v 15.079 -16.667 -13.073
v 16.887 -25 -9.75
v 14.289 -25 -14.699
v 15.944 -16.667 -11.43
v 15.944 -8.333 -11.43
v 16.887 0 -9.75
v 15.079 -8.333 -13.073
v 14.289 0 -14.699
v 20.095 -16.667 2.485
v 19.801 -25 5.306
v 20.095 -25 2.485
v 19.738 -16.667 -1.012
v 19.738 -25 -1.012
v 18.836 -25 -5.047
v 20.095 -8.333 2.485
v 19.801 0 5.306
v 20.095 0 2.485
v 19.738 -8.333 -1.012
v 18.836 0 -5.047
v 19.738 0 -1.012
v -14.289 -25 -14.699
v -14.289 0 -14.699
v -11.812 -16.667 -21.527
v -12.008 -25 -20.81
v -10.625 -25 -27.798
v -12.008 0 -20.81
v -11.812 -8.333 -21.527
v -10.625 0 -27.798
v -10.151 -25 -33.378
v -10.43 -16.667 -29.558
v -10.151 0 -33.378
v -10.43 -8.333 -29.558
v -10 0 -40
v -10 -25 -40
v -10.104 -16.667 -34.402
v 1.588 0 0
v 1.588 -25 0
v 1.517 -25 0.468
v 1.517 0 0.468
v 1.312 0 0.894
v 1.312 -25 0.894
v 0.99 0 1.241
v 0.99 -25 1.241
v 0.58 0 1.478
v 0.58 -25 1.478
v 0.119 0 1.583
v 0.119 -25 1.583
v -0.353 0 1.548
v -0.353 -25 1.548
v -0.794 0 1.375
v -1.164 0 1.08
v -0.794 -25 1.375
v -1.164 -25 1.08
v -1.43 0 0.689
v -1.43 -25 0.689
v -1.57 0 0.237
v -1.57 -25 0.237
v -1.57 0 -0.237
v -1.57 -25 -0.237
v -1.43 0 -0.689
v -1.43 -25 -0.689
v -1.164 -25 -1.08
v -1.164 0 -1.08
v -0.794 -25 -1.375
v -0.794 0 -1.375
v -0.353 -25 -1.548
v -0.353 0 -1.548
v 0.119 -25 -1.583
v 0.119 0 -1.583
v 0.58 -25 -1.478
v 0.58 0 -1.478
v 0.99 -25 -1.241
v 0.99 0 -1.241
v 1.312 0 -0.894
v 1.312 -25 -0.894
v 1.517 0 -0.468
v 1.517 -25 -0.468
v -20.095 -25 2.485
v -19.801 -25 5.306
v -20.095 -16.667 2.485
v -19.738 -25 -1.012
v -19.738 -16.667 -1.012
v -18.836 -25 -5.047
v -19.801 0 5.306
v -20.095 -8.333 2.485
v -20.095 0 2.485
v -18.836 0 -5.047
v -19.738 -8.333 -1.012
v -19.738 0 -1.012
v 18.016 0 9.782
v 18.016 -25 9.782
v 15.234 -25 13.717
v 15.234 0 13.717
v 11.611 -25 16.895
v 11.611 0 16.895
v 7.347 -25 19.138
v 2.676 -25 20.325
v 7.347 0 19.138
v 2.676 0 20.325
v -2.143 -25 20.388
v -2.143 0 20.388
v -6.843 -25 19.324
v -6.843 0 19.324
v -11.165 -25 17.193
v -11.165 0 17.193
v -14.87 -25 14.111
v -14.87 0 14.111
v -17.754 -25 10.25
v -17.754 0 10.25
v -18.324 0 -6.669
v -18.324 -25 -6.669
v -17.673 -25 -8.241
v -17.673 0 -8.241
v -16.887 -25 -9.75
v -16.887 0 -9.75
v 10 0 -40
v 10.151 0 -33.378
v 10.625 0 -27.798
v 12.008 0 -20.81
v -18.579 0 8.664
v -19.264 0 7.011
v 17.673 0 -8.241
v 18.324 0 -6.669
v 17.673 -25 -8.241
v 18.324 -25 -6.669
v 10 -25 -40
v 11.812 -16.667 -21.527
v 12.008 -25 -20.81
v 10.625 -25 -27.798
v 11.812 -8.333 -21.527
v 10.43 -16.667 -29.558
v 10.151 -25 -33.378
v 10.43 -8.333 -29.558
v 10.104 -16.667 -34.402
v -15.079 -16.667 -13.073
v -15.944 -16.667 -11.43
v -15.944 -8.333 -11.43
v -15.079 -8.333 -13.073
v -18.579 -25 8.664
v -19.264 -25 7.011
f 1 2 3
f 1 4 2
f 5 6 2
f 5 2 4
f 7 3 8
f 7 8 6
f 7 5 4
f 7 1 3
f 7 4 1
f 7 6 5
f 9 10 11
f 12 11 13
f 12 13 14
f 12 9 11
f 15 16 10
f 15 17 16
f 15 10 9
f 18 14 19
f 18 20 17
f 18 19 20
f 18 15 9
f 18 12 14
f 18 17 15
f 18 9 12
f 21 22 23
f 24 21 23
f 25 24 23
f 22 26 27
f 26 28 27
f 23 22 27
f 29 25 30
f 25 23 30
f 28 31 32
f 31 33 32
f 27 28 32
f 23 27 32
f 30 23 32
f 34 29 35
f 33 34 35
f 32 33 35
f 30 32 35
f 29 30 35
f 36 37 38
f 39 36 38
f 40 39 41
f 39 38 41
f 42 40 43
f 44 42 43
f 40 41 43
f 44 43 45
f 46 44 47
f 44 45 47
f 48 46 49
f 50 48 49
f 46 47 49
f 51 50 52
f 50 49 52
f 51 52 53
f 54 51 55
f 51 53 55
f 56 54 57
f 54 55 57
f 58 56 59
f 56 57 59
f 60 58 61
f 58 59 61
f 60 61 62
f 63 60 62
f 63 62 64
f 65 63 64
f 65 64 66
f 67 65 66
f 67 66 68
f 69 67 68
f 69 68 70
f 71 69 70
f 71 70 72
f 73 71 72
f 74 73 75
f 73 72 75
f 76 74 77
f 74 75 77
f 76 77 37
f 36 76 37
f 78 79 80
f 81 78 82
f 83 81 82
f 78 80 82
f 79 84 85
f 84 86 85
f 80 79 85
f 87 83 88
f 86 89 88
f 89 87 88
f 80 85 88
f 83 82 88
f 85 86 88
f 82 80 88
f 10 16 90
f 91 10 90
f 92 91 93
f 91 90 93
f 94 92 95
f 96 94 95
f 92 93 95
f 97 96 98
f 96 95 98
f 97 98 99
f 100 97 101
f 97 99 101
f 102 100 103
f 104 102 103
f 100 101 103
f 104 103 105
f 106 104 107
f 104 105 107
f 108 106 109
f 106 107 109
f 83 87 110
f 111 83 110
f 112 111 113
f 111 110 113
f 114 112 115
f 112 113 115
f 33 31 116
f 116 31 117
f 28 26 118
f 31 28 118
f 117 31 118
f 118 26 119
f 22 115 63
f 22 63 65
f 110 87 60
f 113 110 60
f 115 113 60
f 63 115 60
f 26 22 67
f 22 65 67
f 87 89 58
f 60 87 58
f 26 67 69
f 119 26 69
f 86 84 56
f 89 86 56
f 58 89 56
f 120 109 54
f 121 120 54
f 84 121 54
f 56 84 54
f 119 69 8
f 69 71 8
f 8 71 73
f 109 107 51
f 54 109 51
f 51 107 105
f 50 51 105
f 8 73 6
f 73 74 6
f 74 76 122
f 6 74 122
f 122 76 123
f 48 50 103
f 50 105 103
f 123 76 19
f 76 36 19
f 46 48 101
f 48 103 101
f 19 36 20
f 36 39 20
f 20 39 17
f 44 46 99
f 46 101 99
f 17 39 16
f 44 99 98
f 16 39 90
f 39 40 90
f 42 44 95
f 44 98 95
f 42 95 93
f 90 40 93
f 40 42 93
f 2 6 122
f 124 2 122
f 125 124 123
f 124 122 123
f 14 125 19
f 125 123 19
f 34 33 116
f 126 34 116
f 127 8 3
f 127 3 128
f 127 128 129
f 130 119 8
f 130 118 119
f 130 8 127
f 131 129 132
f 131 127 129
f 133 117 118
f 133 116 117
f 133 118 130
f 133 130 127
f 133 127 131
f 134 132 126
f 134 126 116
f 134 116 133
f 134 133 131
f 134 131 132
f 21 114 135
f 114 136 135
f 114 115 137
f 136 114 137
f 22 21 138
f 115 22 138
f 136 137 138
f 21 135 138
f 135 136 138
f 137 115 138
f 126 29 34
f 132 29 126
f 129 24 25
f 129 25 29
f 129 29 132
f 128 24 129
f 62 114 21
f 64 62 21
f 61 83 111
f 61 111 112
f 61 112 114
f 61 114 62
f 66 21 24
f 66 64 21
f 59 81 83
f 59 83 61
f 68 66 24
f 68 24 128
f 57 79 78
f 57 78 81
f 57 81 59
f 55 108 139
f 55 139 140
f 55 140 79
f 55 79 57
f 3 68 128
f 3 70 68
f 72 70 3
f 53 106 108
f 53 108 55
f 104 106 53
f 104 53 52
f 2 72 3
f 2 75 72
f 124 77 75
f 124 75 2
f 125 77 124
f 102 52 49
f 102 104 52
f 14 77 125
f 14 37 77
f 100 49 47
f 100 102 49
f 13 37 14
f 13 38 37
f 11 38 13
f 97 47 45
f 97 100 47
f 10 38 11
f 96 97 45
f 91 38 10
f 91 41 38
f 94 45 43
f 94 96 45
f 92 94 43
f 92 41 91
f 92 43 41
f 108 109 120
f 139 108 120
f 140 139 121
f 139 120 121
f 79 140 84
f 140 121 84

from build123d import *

# Parameters (mm, degrees)
F1_DEPTH = 25
F2_R     = 1.5875
F3_DEPTH = 25


with BuildPart() as f1:
    # F0 (on Front) → F1 (new body)
    with BuildSketch(Plane.XZ):
        with BuildLine():
            ThreePointArc((-17.7535207776, 10.25), (-18.9395304165, 7.8450103635), (-19.8014794389, 5.3057904246))
            add(Edge.make_bspline(
                [(-19.8014794389, 5.3057904246), (-20.454122155, 2.8700946489), (-19.9763700286, -0.7893865531), (-18.8355536126, -5.0469713795)],
                knots=[0, 0, 0, 0, 10.3977252163, 10.3977252163, 10.3977252163, 10.3977252163], degree=3))
            ThreePointArc((-18.8355536126, -5.0469713795), (-19.3331747968, 2.5452607483), (-16.8874953738, 9.75))
            Line((-16.8874953738, 9.75), (-17.7535207776, 10.25))
        make_face()
        with BuildLine():
            add(Edge.make_bspline(
                [(19.8014794389, 5.3057904246), (20.454122155, 2.8700946489), (19.9763700286, -0.7893865531), (18.8355536126, -5.0469713795)],
                knots=[0, 0, 0, 0, 10.3977252163, 10.3977252163, 10.3977252163, 10.3977252163], degree=3))
            ThreePointArc((19.8014794389, 5.3057904246), (2.6757869405, 20.3246196582), (-17.7535207776, 10.25))
            Line((-17.7535207776, 10.25), (-16.8874953738, 9.75))
            ThreePointArc((-16.8874953738, 9.75), (5.0469713795, 18.8355536126), (19.5, 0))
            ThreePointArc((19.5, 0), (19.3331747968, -2.5452607483), (18.8355536126, -5.0469713795))
        make_face()
        with BuildLine():
            ThreePointArc((-16.8874953738, -9.75), (0, -19.5), (16.8874953738, -9.75))
            ThreePointArc((16.8874953738, -9.75), (18.015650884, -7.4623269311), (18.8355536126, -5.0469713795))
            ThreePointArc((18.8355536126, -5.0469713795), (19.3331747968, -2.5452607483), (19.5, 0))
            ThreePointArc((19.5, 0), (5.0469713795, 18.8355536126), (-16.8874953738, 9.75))
            ThreePointArc((-16.8874953738, 9.75), (-19.3331747968, 2.5452607483), (-18.8355536126, -5.0469713795))
            ThreePointArc((-18.8355536126, -5.0469713795), (-18.015650884, -7.4623269311), (-16.8874953738, -9.75))
        make_face()
        with BuildLine():
            add(Edge.make_bspline(
                [(-16.8874953738, -9.75), (-15.9041162308, -11.4532626388), (-15.0411330668, -13.0764351646), (-14.2892263879, -14.6992519958)],
                knots=[0, 0, 0, 0, 6.1017074107, 6.1017074107, 6.1017074107, 6.1017074107], degree=3))
            ThreePointArc((-14.2892263879, -14.6992519958), (-0.3862841846, -20.4963602751), (13.7252177136, -15.2272255751))
            Line((13.7252177136, -15.2272255751), (16.8874953738, -9.75))
            ThreePointArc((16.8874953738, -9.75), (0, -19.5), (-16.8874953738, -9.75))
        make_face()
        with BuildLine():
            Line((-10, -40), (10, -40))
            add(Edge.make_bspline(
                [(14.2892263879, -14.6992519958), (11.2180568693, -21.327661778), (10, -27.950137429), (10, -40)],
                knots=[6.1017074107, 6.1017074107, 6.1017074107, 6.1017074107, 31.0241856061, 31.0241856061, 31.0241856061, 31.0241856061], degree=3))
            ThreePointArc((14.2892263879, -14.6992519958), (14.0097094404, -14.9658959436), (13.7252177136, -15.2272255751))
            ThreePointArc((13.7252177136, -15.2272255751), (-0.3862841846, -20.4963602751), (-14.2892263879, -14.6992519958))
            add(Edge.make_bspline(
                [(-14.2892263879, -14.6992519958), (-11.2180568693, -21.327661778), (-10, -27.950137429), (-10, -40)],
                knots=[6.1017074107, 6.1017074107, 6.1017074107, 6.1017074107, 31.0241856061, 31.0241856061, 31.0241856061, 31.0241856061], degree=3))
        make_face()
        with BuildLine():
            ThreePointArc((13.7252177136, -15.2272255751), (14.0097094404, -14.9658959436), (14.2892263879, -14.6992519958))
            add(Edge.make_bspline(
                [(16.8874953738, -9.75), (15.9041162308, -11.4532626388), (15.0411330668, -13.0764351646), (14.2892263879, -14.6992519958)],
                knots=[0, 0, 0, 0, 6.1017074107, 6.1017074107, 6.1017074107, 6.1017074107], degree=3))
            Line((16.8874953738, -9.75), (13.7252177136, -15.2272255751))
        make_face()
    extrude(amount=F1_DEPTH)

    # F2 (on face) → F3 (cut)
    with BuildSketch(Plane.XZ.offset(25)):
        Circle(F2_R)
    extrude(amount=-F3_DEPTH, mode=Mode.SUBTRACT)


solid = f1.part
